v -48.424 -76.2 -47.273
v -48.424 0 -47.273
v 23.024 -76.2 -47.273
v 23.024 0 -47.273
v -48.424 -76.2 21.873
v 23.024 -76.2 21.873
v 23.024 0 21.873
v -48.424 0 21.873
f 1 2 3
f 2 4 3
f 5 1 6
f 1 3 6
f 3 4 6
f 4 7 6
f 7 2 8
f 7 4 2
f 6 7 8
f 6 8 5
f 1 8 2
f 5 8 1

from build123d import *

# Parameters (mm, degrees)
F0_W      = 46.048916
F0_H      = 43.746476
F1_DEPTH  = 50.8
F1_FACE_W = 46.048916
F1_FACE_H = 43.746476
F2_DEPTH  = 25.4
F2_FACE_W = 46.048916
F2_FACE_H = 76.2
F3_DEPTH  = 25.4
F3_FACE_W = 76.2
F3_FACE_H = 69.146476
F4_DEPTH  = 25.4


with BuildPart() as f1:
    # F0 (on Front) → F1 (new body)
    with BuildSketch(Plane.XZ):
        Rectangle(F0_W, F0_H)
    extrude(amount=F1_DEPTH)

    # F1_face (on face) → F2 (join)
    with BuildSketch(Plane.XZ.offset(50.8)):
        Rectangle(F1_FACE_W, F1_FACE_H)
    extrude(amount=F2_DEPTH)

    # F2_face (on face) → F3 (join)
    with BuildSketch(Plane(origin=(0, -38.1, -21.873238), x_dir=(1, 0, 0), z_dir=(0, 0, -1))):
        Rectangle(F2_FACE_W, F2_FACE_H)
    extrude(amount=F3_DEPTH)

    # F3_face (on face) → F4 (join)
    with BuildSketch(Plane(origin=(-23.024458, -38.1, -12.7), x_dir=(0, -1, 0), z_dir=(-1, 0, 0))):
        Rectangle(F3_FACE_W, F3_FACE_H)
    extrude(amount=F4_DEPTH)


solid = f1.part
